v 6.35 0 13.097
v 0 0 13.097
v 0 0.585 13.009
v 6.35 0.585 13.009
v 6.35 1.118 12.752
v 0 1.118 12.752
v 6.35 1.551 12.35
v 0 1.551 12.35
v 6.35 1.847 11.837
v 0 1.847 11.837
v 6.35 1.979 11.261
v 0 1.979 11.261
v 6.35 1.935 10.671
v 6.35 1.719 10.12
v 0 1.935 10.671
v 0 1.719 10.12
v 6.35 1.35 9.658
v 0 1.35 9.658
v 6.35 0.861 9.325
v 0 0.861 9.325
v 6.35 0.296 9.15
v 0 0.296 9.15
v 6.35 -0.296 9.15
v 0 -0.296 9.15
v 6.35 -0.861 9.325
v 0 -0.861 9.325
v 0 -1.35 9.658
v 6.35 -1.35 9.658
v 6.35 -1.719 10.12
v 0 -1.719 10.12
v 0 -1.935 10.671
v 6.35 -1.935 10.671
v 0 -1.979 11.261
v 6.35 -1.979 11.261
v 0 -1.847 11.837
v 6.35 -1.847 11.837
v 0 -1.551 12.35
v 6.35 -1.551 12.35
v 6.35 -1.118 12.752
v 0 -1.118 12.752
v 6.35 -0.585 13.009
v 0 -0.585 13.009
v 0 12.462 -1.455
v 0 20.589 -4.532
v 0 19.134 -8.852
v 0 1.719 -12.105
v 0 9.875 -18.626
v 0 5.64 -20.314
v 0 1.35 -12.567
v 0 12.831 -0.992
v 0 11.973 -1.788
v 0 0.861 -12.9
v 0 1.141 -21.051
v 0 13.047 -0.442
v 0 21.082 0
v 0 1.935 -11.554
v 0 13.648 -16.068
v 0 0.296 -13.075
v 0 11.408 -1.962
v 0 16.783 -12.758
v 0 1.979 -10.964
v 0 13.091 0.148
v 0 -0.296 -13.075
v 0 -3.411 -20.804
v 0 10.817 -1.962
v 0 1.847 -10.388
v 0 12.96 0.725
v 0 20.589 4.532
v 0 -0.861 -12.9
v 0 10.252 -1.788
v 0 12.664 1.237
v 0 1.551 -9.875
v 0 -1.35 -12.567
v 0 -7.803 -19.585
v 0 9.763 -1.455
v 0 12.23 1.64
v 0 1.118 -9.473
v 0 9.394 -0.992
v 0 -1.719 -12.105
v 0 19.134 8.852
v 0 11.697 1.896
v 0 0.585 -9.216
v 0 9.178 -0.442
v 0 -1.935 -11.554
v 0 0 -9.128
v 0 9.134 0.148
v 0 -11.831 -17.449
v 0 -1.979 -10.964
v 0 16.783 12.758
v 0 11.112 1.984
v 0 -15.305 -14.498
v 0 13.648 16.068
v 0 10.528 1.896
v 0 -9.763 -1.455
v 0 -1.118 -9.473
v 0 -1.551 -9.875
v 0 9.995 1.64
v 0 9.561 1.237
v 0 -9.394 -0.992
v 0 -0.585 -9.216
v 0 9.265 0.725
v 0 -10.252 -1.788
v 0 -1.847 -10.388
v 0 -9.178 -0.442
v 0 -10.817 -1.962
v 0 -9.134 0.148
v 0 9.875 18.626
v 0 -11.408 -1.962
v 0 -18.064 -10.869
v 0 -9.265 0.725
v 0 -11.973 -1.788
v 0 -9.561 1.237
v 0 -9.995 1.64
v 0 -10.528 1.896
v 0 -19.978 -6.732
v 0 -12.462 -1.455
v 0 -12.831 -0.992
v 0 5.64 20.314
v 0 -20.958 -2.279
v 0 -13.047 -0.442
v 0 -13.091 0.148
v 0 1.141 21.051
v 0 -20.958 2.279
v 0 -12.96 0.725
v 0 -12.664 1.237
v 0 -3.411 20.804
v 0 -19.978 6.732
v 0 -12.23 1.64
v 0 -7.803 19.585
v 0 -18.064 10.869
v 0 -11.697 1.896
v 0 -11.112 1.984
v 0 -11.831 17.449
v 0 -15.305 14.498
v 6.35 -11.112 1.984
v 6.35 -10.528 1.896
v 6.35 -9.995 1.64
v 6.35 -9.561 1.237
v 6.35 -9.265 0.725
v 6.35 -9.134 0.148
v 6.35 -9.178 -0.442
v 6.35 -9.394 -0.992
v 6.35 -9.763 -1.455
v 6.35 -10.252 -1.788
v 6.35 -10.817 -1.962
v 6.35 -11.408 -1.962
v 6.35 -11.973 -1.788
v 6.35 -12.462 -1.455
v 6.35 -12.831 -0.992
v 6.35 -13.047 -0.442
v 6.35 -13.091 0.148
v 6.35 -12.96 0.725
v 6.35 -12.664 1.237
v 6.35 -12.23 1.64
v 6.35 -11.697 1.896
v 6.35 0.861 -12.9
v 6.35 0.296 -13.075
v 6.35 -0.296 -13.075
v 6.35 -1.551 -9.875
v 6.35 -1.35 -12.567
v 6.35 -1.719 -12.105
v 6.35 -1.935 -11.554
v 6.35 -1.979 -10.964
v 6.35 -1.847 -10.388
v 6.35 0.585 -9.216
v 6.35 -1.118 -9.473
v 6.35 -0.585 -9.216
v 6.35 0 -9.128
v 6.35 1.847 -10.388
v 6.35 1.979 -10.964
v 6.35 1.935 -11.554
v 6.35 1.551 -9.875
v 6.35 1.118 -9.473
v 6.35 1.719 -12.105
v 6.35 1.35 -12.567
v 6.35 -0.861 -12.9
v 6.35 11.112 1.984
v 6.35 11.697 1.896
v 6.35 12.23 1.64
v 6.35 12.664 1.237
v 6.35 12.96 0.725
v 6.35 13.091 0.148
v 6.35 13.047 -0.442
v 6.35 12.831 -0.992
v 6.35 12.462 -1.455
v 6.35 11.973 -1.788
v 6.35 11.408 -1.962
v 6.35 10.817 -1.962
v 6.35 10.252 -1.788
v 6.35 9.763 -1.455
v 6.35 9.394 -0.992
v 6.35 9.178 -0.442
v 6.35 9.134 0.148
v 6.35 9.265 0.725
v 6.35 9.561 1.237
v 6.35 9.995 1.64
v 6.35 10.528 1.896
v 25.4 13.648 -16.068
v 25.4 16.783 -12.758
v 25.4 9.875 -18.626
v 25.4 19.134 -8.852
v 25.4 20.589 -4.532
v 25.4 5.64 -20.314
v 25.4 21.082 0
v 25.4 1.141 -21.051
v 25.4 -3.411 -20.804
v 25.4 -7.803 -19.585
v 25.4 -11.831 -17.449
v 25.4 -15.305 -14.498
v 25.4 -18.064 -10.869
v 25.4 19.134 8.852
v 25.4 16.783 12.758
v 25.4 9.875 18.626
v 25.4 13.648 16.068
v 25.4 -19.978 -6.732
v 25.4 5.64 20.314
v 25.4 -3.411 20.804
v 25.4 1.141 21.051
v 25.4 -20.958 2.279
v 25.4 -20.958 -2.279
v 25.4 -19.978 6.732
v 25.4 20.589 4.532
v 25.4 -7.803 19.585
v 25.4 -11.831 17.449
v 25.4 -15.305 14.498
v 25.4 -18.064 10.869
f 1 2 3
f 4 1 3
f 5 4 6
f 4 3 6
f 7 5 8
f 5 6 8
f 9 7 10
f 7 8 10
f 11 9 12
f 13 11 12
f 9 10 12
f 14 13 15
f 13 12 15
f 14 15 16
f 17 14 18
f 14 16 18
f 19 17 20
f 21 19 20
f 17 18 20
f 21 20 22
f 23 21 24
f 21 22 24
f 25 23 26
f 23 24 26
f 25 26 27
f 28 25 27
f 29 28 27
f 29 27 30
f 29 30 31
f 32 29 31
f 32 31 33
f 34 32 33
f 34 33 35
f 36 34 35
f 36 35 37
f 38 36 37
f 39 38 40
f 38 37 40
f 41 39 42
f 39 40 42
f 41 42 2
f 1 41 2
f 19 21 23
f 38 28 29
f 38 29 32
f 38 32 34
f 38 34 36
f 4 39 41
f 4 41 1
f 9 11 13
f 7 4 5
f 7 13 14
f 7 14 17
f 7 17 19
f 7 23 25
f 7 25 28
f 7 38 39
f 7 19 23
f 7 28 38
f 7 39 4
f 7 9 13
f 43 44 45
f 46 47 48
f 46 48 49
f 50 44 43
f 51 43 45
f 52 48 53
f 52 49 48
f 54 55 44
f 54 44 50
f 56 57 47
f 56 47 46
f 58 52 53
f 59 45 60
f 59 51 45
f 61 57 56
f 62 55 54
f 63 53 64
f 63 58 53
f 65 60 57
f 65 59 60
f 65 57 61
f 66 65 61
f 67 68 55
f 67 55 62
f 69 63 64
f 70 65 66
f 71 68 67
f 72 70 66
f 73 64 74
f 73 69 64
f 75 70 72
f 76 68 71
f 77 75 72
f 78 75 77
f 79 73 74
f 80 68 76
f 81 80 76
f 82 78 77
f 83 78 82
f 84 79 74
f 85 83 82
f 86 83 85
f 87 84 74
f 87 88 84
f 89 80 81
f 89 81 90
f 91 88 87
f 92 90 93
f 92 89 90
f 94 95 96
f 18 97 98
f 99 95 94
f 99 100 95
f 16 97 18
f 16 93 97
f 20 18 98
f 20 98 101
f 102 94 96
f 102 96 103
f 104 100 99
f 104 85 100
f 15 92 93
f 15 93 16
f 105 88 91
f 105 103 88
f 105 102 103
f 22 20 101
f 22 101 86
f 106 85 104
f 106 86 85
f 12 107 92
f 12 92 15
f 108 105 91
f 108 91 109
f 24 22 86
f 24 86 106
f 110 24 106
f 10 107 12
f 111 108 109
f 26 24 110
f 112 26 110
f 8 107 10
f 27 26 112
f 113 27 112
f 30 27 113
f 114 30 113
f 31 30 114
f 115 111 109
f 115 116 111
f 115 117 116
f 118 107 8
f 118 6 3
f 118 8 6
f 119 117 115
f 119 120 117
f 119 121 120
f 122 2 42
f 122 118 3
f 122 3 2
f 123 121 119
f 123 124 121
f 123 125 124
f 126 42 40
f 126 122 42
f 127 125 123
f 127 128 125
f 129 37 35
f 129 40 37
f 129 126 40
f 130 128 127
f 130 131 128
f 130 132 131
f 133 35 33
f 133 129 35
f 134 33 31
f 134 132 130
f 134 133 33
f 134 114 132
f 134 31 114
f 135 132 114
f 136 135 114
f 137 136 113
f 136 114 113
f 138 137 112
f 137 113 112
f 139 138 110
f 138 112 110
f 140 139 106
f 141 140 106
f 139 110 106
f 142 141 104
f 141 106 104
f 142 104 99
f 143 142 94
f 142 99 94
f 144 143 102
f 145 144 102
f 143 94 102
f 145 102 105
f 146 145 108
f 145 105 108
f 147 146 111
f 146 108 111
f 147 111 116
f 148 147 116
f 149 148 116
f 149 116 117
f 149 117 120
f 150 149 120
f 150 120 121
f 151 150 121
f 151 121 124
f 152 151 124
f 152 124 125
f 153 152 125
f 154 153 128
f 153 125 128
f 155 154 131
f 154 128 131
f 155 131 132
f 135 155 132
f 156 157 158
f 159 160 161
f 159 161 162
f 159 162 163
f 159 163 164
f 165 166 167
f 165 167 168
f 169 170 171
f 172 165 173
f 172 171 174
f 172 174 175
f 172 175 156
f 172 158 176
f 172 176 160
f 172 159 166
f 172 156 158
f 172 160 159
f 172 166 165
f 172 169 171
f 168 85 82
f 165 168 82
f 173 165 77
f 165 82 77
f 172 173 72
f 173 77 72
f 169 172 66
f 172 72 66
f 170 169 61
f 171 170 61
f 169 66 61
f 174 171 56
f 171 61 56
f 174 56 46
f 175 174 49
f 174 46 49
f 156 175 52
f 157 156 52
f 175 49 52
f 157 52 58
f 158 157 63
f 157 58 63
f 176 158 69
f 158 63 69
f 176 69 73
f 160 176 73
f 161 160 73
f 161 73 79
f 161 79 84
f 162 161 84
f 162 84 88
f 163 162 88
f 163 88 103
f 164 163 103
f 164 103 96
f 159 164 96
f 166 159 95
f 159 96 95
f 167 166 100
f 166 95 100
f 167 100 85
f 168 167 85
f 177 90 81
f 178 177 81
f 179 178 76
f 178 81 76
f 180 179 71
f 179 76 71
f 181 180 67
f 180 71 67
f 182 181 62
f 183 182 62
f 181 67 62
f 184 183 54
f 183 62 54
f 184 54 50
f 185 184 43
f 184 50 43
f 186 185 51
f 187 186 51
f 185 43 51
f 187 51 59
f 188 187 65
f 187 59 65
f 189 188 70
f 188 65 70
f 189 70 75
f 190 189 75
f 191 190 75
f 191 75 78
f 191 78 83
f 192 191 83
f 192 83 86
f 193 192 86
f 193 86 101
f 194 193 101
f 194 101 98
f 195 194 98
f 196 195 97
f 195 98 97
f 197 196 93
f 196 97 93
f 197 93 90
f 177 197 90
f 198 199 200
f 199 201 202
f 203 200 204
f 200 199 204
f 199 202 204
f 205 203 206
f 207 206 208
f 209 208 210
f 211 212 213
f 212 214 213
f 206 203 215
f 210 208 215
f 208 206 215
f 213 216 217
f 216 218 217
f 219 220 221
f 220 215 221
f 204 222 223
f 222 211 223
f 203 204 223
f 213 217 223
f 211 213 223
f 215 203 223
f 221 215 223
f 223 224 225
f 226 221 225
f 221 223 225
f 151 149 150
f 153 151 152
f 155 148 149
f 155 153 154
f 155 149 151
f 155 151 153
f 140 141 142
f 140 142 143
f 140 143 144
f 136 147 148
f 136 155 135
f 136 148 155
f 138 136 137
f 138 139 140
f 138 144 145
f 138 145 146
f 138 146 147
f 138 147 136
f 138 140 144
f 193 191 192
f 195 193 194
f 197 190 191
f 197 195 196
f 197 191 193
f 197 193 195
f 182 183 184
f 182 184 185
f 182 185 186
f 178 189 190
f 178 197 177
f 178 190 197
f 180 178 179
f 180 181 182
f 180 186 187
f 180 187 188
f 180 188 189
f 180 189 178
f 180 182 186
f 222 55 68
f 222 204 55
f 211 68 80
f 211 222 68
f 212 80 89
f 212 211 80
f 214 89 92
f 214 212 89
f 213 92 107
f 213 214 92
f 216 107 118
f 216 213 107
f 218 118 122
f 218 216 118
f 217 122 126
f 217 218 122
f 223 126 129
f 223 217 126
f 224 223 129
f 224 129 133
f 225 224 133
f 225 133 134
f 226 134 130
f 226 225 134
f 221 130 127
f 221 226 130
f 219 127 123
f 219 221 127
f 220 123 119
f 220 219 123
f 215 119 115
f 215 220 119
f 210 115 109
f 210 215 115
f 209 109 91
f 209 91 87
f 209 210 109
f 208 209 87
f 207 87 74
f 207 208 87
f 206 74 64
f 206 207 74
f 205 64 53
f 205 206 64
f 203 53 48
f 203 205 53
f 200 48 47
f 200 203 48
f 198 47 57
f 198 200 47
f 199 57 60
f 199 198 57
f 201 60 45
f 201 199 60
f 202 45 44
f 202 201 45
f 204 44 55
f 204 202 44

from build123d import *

# Parameters (mm, degrees)
SKETCH1_W          = 25.4
SKETCH1_H          = 21.082
SKETCH2_R          = 1.984375
CUT_EXTRUDE1_DEPTH = 6.35


with BuildPart() as part:
    # Sketch1 → Revolve1 (revolve)
    with BuildSketch(Plane.XY):
        with Locations((12.7, 10.541)):
            Rectangle(SKETCH1_W, SKETCH1_H)
    revolve(axis=Axis((-29.670962963, 0, 0), (1, 0, 0)))

    # Sketch2 → Cut-Extrude1 (cut)
    with BuildSketch(Plane.ZY):
        with Locations((0, 11.1125)):
            Circle(SKETCH2_R)
        with Locations((11.1125, 0)):
            Circle(SKETCH2_R)
        with Locations((0, -11.1125)):
            Circle(SKETCH2_R)
        with Locations((-11.1125, 0)):
            Circle(SKETCH2_R)
    extrude(amount=-CUT_EXTRUDE1_DEPTH, mode=Mode.SUBTRACT)


solid = part.part
